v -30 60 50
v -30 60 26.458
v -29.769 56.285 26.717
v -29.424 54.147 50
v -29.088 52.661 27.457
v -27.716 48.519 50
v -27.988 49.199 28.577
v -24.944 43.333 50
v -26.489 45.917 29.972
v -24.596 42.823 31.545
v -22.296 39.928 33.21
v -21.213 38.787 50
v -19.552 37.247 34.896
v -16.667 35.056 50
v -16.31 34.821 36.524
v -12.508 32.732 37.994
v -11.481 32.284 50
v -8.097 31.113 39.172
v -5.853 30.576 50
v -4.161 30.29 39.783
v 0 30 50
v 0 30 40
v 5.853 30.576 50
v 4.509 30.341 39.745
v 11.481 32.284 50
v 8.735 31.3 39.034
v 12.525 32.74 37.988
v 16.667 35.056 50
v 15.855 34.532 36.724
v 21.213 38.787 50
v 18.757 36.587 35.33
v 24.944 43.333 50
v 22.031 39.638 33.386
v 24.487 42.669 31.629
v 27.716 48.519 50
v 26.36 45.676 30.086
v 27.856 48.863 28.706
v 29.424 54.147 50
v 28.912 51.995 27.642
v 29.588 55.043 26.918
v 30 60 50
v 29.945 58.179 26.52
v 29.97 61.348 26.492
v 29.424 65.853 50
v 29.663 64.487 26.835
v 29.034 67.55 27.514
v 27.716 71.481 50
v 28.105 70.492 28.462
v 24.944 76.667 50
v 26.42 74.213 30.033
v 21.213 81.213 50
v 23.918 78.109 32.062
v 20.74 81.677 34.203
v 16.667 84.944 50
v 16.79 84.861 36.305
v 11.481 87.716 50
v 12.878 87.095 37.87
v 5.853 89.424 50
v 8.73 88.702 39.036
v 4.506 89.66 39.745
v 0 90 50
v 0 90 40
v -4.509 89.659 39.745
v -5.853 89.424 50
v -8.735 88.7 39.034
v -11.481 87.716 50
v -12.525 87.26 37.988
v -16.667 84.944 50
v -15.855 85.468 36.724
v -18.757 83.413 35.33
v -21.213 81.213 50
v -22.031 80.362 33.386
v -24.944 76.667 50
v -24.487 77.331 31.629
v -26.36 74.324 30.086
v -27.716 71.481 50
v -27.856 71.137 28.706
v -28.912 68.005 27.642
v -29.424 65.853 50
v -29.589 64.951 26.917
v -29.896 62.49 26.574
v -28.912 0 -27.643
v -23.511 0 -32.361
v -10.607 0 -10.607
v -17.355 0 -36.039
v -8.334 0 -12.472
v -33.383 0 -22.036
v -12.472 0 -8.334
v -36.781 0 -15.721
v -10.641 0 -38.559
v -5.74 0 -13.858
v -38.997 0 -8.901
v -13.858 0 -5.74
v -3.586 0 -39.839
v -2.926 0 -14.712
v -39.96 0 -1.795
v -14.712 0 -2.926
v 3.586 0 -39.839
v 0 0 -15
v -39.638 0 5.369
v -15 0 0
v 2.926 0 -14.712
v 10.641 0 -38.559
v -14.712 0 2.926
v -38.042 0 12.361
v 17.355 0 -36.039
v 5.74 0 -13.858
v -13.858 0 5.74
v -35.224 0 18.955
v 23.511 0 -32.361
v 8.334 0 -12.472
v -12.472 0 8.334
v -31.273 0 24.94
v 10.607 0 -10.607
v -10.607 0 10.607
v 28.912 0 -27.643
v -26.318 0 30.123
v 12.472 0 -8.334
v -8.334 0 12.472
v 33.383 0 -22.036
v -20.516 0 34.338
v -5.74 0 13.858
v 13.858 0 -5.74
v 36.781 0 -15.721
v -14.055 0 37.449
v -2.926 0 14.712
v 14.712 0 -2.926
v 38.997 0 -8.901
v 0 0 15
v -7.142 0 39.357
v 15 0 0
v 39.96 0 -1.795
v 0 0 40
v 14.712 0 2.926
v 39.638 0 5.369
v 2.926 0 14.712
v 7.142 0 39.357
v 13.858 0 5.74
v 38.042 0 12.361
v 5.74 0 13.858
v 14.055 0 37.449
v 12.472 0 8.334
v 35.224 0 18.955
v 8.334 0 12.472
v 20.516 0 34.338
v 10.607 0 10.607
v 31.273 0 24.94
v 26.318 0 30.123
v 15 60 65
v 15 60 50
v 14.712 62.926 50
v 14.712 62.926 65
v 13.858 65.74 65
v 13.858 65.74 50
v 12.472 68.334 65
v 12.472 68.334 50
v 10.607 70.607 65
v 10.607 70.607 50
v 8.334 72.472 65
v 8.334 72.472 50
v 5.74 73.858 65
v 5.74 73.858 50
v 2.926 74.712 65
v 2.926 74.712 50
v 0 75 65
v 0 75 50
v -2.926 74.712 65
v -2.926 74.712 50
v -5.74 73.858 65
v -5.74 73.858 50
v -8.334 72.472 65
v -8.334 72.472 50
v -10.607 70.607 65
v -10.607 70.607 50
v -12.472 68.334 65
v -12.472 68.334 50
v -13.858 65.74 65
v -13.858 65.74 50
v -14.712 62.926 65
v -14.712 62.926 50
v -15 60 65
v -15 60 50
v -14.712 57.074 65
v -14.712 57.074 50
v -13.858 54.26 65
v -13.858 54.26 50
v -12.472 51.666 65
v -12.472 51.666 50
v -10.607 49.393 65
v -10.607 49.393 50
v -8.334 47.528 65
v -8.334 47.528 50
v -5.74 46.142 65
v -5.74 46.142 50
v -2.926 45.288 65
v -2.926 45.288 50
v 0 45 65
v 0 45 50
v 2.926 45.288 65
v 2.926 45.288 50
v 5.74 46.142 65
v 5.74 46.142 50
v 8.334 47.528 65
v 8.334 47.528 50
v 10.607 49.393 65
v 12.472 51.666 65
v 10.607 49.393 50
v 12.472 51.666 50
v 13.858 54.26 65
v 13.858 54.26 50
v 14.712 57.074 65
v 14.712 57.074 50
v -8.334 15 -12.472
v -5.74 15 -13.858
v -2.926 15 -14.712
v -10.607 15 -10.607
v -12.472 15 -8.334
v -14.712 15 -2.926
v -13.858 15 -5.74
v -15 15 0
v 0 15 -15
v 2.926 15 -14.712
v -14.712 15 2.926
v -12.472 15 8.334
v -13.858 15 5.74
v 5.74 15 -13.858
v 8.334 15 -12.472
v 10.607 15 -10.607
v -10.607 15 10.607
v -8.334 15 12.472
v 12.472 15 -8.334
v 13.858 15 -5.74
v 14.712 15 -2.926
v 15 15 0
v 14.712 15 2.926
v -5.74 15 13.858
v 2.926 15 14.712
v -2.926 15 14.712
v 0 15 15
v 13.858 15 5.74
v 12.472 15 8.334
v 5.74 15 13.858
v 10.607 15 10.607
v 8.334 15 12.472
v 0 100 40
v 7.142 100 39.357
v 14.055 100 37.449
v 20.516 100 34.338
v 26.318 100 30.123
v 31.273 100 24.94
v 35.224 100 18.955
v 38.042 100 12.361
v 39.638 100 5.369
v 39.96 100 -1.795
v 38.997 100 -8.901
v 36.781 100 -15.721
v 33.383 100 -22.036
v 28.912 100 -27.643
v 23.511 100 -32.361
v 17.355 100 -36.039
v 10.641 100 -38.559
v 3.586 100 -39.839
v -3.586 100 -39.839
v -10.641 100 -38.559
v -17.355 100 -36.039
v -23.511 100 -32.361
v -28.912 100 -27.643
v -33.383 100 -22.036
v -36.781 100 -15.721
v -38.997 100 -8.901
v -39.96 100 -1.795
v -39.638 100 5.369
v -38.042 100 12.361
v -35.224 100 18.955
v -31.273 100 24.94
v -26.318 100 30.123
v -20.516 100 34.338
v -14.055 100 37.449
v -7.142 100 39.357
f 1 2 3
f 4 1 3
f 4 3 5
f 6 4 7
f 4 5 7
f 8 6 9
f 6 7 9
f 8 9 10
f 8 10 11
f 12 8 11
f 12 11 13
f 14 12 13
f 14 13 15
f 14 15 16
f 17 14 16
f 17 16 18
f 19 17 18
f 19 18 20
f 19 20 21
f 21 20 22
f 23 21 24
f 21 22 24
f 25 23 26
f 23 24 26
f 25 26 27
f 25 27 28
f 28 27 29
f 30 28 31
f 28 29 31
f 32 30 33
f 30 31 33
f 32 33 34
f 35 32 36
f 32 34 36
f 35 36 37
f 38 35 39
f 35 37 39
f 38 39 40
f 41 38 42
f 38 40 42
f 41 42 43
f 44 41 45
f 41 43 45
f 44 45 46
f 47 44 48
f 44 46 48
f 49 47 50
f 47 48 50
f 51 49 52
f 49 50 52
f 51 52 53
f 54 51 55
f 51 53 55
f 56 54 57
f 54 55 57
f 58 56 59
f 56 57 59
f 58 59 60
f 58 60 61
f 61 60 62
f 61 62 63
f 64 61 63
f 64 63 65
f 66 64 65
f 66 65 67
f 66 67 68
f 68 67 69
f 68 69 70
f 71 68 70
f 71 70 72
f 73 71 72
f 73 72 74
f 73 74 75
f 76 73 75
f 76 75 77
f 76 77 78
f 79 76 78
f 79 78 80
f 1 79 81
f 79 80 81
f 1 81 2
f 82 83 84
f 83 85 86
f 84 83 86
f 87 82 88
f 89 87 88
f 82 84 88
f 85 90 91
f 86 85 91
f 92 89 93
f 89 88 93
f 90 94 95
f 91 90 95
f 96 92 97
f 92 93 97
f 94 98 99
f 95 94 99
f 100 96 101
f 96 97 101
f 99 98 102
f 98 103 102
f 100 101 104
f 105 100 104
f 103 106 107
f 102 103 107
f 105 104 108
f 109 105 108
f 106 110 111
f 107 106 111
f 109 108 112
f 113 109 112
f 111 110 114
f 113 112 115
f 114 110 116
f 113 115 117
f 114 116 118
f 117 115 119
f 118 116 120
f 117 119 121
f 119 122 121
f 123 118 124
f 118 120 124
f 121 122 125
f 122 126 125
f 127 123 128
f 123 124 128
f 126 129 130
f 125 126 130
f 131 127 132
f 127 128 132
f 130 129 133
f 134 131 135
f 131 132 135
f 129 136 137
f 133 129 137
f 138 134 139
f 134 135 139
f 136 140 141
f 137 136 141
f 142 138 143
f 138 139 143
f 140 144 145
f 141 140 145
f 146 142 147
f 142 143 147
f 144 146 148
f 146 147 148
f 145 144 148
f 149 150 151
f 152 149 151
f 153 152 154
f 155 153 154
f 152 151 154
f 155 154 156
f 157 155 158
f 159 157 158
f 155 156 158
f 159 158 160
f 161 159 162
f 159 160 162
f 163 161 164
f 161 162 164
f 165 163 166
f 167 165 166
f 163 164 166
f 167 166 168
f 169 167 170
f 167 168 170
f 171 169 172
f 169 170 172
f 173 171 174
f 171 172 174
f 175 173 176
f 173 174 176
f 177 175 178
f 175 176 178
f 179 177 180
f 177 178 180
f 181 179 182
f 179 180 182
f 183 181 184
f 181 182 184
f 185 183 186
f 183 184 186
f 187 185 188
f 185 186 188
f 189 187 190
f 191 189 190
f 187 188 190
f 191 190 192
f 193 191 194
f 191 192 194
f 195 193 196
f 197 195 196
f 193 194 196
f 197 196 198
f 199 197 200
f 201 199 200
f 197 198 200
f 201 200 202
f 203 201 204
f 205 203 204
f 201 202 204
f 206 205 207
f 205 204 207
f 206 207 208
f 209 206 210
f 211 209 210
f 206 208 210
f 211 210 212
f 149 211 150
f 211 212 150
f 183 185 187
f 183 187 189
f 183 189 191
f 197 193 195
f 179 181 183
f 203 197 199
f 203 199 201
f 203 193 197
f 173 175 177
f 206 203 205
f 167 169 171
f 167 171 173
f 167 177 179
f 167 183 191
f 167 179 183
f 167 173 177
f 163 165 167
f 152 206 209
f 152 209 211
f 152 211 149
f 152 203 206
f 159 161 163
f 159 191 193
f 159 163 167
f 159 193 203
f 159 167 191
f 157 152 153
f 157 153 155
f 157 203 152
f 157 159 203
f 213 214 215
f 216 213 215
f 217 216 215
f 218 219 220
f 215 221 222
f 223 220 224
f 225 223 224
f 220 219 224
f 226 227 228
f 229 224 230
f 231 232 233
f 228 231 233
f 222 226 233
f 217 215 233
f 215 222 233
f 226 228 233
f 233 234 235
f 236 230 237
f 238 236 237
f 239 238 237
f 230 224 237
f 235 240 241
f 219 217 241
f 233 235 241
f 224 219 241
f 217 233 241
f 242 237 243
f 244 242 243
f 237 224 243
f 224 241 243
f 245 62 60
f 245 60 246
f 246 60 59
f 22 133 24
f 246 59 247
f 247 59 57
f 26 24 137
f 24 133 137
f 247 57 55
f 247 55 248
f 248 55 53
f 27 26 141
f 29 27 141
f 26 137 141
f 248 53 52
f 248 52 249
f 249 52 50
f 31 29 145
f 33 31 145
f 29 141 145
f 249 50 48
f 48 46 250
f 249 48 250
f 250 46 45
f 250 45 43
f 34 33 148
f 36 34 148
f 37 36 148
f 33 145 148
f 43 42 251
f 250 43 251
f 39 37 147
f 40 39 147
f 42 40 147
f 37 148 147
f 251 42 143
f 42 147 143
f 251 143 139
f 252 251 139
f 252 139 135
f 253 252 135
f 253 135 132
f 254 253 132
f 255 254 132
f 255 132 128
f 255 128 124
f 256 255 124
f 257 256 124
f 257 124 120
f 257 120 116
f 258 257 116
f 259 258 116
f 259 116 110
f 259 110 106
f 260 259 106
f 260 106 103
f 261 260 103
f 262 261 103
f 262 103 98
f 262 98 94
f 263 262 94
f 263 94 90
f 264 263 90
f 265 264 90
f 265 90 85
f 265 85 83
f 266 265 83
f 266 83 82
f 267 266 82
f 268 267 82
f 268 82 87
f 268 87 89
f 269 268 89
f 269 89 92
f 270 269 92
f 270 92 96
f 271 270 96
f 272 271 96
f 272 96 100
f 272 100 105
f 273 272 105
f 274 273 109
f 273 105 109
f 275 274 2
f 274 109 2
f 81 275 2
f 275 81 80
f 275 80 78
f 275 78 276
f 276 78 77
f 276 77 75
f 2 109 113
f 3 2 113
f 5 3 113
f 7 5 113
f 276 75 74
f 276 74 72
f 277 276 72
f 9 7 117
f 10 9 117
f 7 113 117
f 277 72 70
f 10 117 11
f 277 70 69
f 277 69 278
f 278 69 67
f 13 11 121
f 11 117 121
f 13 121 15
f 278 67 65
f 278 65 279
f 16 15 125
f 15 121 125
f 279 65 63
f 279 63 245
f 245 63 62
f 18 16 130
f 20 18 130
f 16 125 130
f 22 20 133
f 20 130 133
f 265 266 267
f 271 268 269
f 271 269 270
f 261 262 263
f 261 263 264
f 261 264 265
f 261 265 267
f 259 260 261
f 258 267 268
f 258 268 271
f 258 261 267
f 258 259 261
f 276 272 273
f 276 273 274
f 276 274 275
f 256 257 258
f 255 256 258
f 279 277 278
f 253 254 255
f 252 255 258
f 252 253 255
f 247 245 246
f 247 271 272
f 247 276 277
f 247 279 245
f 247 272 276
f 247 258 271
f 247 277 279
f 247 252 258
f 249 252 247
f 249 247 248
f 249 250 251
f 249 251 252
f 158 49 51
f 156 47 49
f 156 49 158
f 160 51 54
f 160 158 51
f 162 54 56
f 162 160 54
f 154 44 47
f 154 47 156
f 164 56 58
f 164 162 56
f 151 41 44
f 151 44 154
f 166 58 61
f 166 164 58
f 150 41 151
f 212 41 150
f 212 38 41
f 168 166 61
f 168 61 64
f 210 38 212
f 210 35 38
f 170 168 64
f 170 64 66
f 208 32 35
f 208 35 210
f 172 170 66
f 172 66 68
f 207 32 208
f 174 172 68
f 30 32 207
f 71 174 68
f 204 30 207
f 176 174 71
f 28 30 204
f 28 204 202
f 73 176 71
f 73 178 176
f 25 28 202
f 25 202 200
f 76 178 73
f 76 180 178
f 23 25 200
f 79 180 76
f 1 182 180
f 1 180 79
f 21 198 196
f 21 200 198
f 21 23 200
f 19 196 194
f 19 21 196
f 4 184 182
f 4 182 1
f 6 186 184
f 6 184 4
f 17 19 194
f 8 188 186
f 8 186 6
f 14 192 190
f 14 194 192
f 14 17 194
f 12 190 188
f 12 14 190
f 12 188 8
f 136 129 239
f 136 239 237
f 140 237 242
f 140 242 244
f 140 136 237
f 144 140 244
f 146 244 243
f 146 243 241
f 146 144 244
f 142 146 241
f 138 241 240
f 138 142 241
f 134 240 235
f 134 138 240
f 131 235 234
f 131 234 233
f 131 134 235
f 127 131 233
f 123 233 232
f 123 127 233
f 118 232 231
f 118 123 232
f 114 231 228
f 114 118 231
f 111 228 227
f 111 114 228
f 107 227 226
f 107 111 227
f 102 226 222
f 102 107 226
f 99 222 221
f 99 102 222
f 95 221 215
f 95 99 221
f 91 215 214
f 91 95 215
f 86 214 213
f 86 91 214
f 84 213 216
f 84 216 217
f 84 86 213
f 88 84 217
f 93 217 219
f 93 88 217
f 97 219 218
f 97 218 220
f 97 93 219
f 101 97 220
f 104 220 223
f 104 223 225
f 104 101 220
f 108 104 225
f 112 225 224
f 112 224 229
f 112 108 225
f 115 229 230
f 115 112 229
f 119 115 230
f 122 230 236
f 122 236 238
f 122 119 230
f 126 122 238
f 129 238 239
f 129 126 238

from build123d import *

# Parameters (mm, degrees)
SKETCH1_R           = 40
BOSS_EXTRUDE1_DEPTH = 100
SKETCH2_R           = 30
SKETCH2_R_2         = 15
BOSS_EXTRUDE2_DEPTH = 50
SKETCH1_3_R         = 15
CUT_EXTRUDE1_DEPTH  = 15
BOSS_EXTRUDE3_START = 50
SKETCH2_4_R         = 15
BOSS_EXTRUDE3_DEPTH = 15


with BuildPart() as part:
    # Sketch1 → Boss-Extrude1 (new body)
    with BuildSketch(Plane(origin=(0, 0, 0), x_dir=(1, 0, 0), z_dir=(0, 1, 0))):
        with Locations(Location((0, 0, 0), (0, 0, 270))):
            Circle(SKETCH1_R)
    extrude(amount=BOSS_EXTRUDE1_DEPTH)

    # Sketch2 → Boss-Extrude2 (add)
    with BuildSketch(Plane.XY):
        with Locations(Location((0, 60, 0), (0, 0, 180))):
            Circle(SKETCH2_R)
        with Locations((0, 60)):
            Circle(SKETCH2_R_2, mode=Mode.SUBTRACT)
        with Locations((0, 60)):
            Circle(SKETCH2_R_2)
    extrude(amount=BOSS_EXTRUDE2_DEPTH)

    # Sketch1<3> → Cut-Extrude1 (cut)
    with BuildSketch(Plane(origin=(0, 0, 0), x_dir=(1, 0, 0), z_dir=(0, 1, 0))):
        with Locations(Location((0, 0, 0), (0, 0, 270))):
            Circle(SKETCH1_3_R)
    extrude(amount=CUT_EXTRUDE1_DEPTH, mode=Mode.SUBTRACT)

    # Sketch2<4> → Boss-Extrude3 (add)
    with BuildSketch(Plane.XY.offset(BOSS_EXTRUDE3_START)):
        with Locations((0, 60)):
            Circle(SKETCH2_4_R)
    extrude(amount=BOSS_EXTRUDE3_DEPTH)


solid = part.part
